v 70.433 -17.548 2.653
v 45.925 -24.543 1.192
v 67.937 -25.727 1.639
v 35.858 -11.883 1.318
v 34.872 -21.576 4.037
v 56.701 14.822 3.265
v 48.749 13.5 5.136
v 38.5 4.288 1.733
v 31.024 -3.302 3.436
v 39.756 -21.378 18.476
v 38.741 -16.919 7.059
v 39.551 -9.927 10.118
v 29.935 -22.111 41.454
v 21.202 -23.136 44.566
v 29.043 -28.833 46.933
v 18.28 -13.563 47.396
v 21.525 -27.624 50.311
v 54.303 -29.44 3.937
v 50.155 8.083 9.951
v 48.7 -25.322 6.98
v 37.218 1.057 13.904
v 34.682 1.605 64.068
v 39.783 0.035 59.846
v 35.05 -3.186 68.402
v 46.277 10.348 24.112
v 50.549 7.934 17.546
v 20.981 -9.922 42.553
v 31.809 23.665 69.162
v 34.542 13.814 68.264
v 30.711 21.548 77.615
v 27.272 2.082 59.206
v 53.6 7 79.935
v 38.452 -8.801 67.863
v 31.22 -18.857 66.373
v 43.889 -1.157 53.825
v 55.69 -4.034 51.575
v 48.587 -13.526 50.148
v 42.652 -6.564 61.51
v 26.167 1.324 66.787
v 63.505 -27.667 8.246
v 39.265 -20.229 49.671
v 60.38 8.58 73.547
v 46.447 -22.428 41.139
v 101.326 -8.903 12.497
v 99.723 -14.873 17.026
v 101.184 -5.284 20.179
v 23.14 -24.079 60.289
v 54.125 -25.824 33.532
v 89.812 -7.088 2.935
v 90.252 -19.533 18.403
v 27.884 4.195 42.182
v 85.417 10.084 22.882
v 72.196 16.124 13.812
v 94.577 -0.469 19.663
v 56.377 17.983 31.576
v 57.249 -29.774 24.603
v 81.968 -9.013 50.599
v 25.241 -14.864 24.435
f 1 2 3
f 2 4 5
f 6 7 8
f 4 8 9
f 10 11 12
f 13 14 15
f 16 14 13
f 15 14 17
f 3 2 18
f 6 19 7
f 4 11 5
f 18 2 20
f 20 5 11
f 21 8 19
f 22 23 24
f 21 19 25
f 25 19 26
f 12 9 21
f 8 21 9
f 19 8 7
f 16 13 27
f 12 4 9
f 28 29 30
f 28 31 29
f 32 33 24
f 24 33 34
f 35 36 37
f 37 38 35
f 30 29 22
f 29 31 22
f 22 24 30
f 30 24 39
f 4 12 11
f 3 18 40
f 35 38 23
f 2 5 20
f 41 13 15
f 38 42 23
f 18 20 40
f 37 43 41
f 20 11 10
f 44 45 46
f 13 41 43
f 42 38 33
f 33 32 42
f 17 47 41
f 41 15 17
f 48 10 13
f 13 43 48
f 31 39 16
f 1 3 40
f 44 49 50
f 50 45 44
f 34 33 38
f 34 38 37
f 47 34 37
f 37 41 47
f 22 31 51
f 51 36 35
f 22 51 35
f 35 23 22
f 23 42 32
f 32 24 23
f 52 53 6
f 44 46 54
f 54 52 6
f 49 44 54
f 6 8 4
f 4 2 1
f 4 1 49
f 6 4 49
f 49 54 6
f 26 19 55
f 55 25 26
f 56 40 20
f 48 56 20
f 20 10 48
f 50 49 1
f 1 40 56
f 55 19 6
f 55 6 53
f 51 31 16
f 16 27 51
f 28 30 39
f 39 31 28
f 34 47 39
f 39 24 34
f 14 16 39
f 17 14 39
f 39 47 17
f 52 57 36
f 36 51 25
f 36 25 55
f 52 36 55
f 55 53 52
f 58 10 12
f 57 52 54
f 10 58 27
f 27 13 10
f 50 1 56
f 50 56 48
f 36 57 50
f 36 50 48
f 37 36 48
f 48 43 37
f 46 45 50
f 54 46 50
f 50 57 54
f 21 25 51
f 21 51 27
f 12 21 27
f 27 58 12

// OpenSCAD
//demo mesh
Flat_treshold=0.3;
  //mesh=trimesh(cubemesh4() );
 // mesh=trimesh(cubemesh3() );
//  mesh= (diamond() );
//
// // mesh=fp_flip(bunny());
//
//echo(len(  mesh[0]),len(mesh[1]));
//
//midmesh = ( tesselate(mesh,0)) ;
// dmaesh=( midmesh );
 nm = fp_decimate (bunny(),1);


// newmesh=relax (dmaesh);
//translate ([120,0,0]) polyhedron(midmesh[0], midmesh[1]);

 translate ([60,0,0]) polyhedron(nm[0], nm[1]);
//translate ([ 0,0,0]) polyhedron(newmesh[0], newmesh[1]);
//
//translate ([-60,0,0]) polyhedron(dmaesh[0], dmaesh[1]);
  // for (i = [0: len(newmesh) - 1]) echo(newmesh[i]);
//echo(len( midmesh[0]),len(dmaesh[0]));

function  trimesh (t)=
let(
t1=t[1],
t2=fp_flatten([for(i=[0:len(t1)-1]) 
 (len( t1[i])==3)?[t1[i]]:[[t1[i][0],t1[i][1],t1[i][2]],[t1[i][0],t1[i][2],t1[i][3]]]     ] )
)[t[0],t2]
;
function tesselate(m,c=1)=
c>=1?
 let (
   pr = fp_privatetize(m), /* convert indexed polyhedron */

 subdv=fp_flatten([for(i=[0:max(0,len(pr)-1)])let(
pr01=lerp(pr[i][0],pr[i][1],0.5),
pr12=lerp(pr[i][1],pr[i][2],0.5),
pr20=lerp(pr[i][2],pr[i][0],0.5)
)[
[pr[i][0],pr01,pr20],
[pr[i][1],pr12,pr01],
[pr[i][2],pr20,pr12],
[pr01,pr12,pr20]

]
]),
 
  newmesh =   fp_glue(subdv)
)
tesselate(newmesh,c-1)
:

m;
 
function fp_decimate (m,i=0,changed=0 ,nn=0)=
let(points=m[0],faces=m[1],n=nn==0||changed>0? neighbours(m):nn )
i<len(points)-1?
let(r=flattness(m,i,n[i]) )
r<=Flat_treshold? 
let(newm=fp_decimateinidex(m,i,n[i]),
newch=len(newm[0])==len(m[0])?changed:changed+1,
newi=len(newm[0])==len(m[0])?i+1:i
)
fp_decimate (newm,newi,newch,n ) 
:fp_decimate (m,i+1,changed ,n)
:
let(e=echo(i+1,changed))
changed>0?

 fp_decimate(m)
:m

;

function flattness(m,j,n)=

let(points=m[0],faces=m[1],ni=n ,

normals=[for(i=[0:max(0,len(ni)-1)])p2n(
 [
points[(faces[ni[i]][0])],
points[(faces[ni[i]][1])],
points[(faces[ni[i]][2])] 
])

],
ne=normeq(normals)


) 
ne
;
function newflattness(m)=

let(points=m[0],faces=m[1],

normals=[for(i=[0:max(0,len(m)-1)])p2n(m[i])

],
ne=normeq(normals)


) 
ne
;
function fp_decimateinidex(m,j,n)=
let(nn=notneighboursofi (m,j),ni=n,points=m[0],faces=m[1])
let(

removies=[for(i=[0:len(ni)-1])([points[(faces[ni[i]][0])],points[(faces[ni[i]][1])],points[(faces[ni[i]][2])]  ])],
newfaces=fp_removevertex(removies,points[j],alt=3),
r=newflattness(newfaces),
h=newflattness(removies)
//e=echo(r,h)
) 
r<=h?
    let(keepers=[for(i=[0:len(nn)-1])([points[(faces[nn[i]][0])],points[(faces[nn[i]][1])],points[(faces[nn[i]][2])]  ])])
    fp_glue( concat(keepers,newfaces))
    :
    let(newfacesalt=fp_removevertex(removies,points[j],alt=5),
    ralt=newflattness(newfacesalt))
    ralt<=h?
        let(keepers=[for(i=[0:len(nn)-1])([points[(faces[nn[i]][0])],points[(faces[nn[i]][1])],points[(faces[nn[i]][2])]  ])])
        fp_glue( concat(keepers,newfacesalt))
        
        :
        let(newfacesalt2=fp_removevertex(removies,points[j],alt=7),
        ralt2=newflattness(newfacesalt2))
        ralt2<=h?
            let(keepers=[for(i=[0:len(nn)-1])([points[(faces[nn[i]][0])],points[(faces[nn[i]][1])],points[(faces[nn[i]][2])]  ])])
            fp_glue( concat(keepers,newfacesalt2))
            
            :
            let(newfacesalt3=fp_removevertex(removies,points[j],alt=11),
            ralt3=newflattness(newfacesalt3))
            ralt3<=h?
                let(keepers=[for(i=[0:len(nn)-1])([points[(faces[nn[i]][0])],points[(faces[nn[i]][1])],points[(faces[nn[i]][2])]  ])])
                fp_glue( concat(keepers,newfacesalt3))

:
m
;

function fp_glue(m)= let (
   hashed = fp_addhash(fp_flatten(m)), /*flatten and pair points with hash*/
   sorted = fp_hashQS(hashed),/*sort by hash*/
   unique = fp_unique(sorted),/*unique by hash*/
   newmesh = [fp_removehash(unique), fp_relink(unique, m)])/* combine to new mesh*/
 newmesh;
 function fusepoints(m) =
 let (
   privatetized = fp_privatetize(m), /* convert indexed polyhedron */
 newmesh= fp_glue(privatetized))
 newmesh;

 function fp_privatetize(m) = 
/* convert indexed polyhedron to vetrtex polygons with private vertex*/
 let (p = m[0], f = m[1], l = max(0,len(f) - 1))[
   for (i = [0: l])[     for (j = [0: len(f[i]) - 1]) p[f[i][j]]   ]];

 function fp_flatten(l) = [   for (a = l)     for (b = a) b ];
 
 function fp_addhash(m) = 
/*pair each point with a hash of the point*/
[   for (i = [0: len(m) - 1])[fp_encode(m[i]), m[i]] ];

 function fp_encode(v) =
 let (xseed = round(fp_rnd(1e8, -1e8, round(v.x * 1e6))),
   yseed = round(fp_rnd(1e8, -1e8, xseed + round(v.y * 1e6))),
   zseed = round(fp_rnd(1e8, -1e8, yseed + round(v.z * 1e6))),
   hash =   round(fp_rnd(1e8, -1e8, zseed)))
 hash;

 function fp_hashQS(arr) = !(len(arr) > 0) ? [] :
 let (pivot = arr[floor(len(arr) / 2)][0],
 lesser = [ for (y = [0: len(arr) - 1]) if (arr[y][0] < pivot) arr[y] ],
 equal = [ for (y = [0: len(arr) - 1]) if (arr[y][0] == pivot) arr[y] ],
 greater = [ for (y = [0: len(arr) - 1]) if (arr[y][0] > pivot) arr[y] ])
 concat(fp_hashQS(lesser), equal, fp_hashQS(greater));

 function fp_unique(m) = [   for (i = [0: len(m) - 1])     if (m[i] != m[i - 1]) m[i] ];

 function fp_rnd(a = 1, b = 0, s = []) = s == [] ? (rands(min(a, b), max(   a, b), 1)[0]) : (rands(min(a, b), max(a, b), 1, s)[0]); 

 function fp_removehash(m) = [   for (i = [0: len(m) - 1]) m[i][1] ];
 function fp_relink(p, f) =
/*convert polygons with private vertex to indexed by searching for hash matches  */
 let (l = len(f) - 1)[   for (i = [0: l])[     for (j = [0: len(f[i]) - 1]) search(fp_encode(f[i][j]), p)[0]] ];
 
 function fp_flip(w)=[w[0],[for(i=[0:len(w[1])-1])[w[1][i][0],w[1][i][2],w[1][i][1]]]];

function lerp(start, end, bias) = (end * bias + start * (1 - bias));

function relax(m, c =  2,nn=0) = 
let(points=m[0], faces=m[1], n=nn==0?neighbours(m):nn)
c > 0 ?
let(
midpoints = 
[ for (i = [0: len(faces) - 1]) avrg( 
[points[faces[i][0]], points[faces[i][1]], points[faces[i][2]]]
) ], 

points2 = [ for (i = [0: len(points) - 1]) len(
n[i]) > 0 ?  avrg([ for (j = [0: len(n[i]) - 1]) midpoints[ n[i] [j]]
 ])  : points[i] ])

relax([points2, faces]  , c - 1,n)
:
 [points, faces];

function neighbours (m)=let(points=m[0],faces=m[1]) [ for (i = [0: len(points) - 1])[ for (j = [0: len(faces) - 1])
 if (faces[j][0] == i || faces[j][1] == i || faces[j][2] == i || faces[j][3] == i) j] ];
function notneighbours (m)=let(points=m[0],faces=m[1]) [ for (i = [0: len(points) - 1])[ for (j = [0: len(faces) - 1])
 if ( (faces[j][0] != i && faces[j][1] != i && faces[j][2] != i && faces[j][3] != i)) j] ];
function neighboursofi (m,i)=let(points=m[0],faces=m[1])
  [ for (j = [0: len(faces) - 1])
 if (faces[j][0] == i || faces[j][1] == i || faces[j][2] == i || faces[j][3] == i) j] ;
function notneighboursofi (m,i)=let(points=m[0],faces=m[1])
  [ for (j = [0: len(faces) - 1])
 if ( (faces[j][0] != i && faces[j][1] != i && faces[j][2] != i && faces[j][3] != i)) j] ;
function addl(l, c = 0) = c < len(l) - 1 ? l[c] + addl(l, c + 1) : l[
 c];
function avrg(l) = len(l) > 1 ? addl(l) / (len(l)) : l;

function fp_removevertex(faces,vertex,alt=0)=let(
n= avrg([for(i=[0:max(0,len(faces)-1)])p2n(faces[i])]),
d= fp_tricylceb(faces,vertex),
c= fp_segorder(d),
e=fp_segcollapse(c),
g=shuffle(e,alt-round(rnd(2))),
f=fp_triangulate(g,n)
//,eco=echo( len(d),len(c))
)
 len(faces)>2&&len(c)==len(d)&&len(f)+2==len(faces)?f: faces 
;


function shuffle(b,l=1)=let(
c=concat( [for(i=[1:len(b)-1])b[i]],[b[0]]))
l>0?shuffle(c,l-1):c
;
function fp_tricylceb(b,p)=[for(i=[0:len(b)-1])fp_tricycle (b[i],p)];

function fp_triangulate(a,n ,count=0)=
count>len(a)?
a
:
len(a)<=3?
[[a[0],a[1],a[2]]]:
sign(dot(p2n([a[0],a[1],a[2]]),n))>0?
let(b=concat([for(i=[2:len(a)-1])a[i]],[a[0]] )) 
concat([[a[0],a[1],a[2]]],fp_triangulate( shuffle(b,2),n )):fp_triangulate( shuffle(a,1),n,count+1 );

function fp_trimeshulate(a)=len(a)>3?let(b=concat([for(i=[2:len(a)-1])a[i]],[a[0]] )
) concat([[a[0],a[1],a[2]]],fp_trimeshulate(shuffle(b,2))):[[a[0],a[1],a[2]]];

function fp_tricycle(f,p)=fp_is_equal(f[0],p)?[f[1],f[2]]:let(f1=[f[1],f[2],f[0]])fp_is_equal(f1[0],p)?[f1[1],f1[2]]:let(f2=[f1[1],f1[2],f1[0]])fp_is_equal(f2[0],p)?[f2[1],f2[2]]:f;

 function fp_is_equal(a, b, d=1e-16) = (a==b) || (abs(a-b)<d) || (norm(a-b)<d);
    function flatten(l) = [ for (li = l, lij = li) lij ];

function rnd(a = 1, b = 0) = (rands(min(a, b), max(a, b), 1)[0]);

 function fp_segorder(n,acc=0,c=0)=c<=len(n)-1?let(newacc= (acc==0)?[n[0]]:let(lookfor= acc[0][0]) concat([for(i=[0:len(n)-1])if(fp_is_equal(lookfor,n[i][1])==true)n[i]],acc ))fp_segorder(n,newacc,c+1):acc;

function fp_segcollapse(n)=
[for(i=[0:len(n)-1])n[i][0]];

function normeq(pl) = 

let (list= [
 for (i = [0: len(pl) - 1],j = [0: len(pl) - 1])
 
 (-1 + dot(pl[i], pl[j])  )
   ]
,
sums = avrg(list) )
 
abs(sums)
 ;

function p2n4(p) =un(p2n(p0,p1,p3)+p2n(p3,p1,p2));
function p2n(p) =
let (pa=p[0], pb=p[1], pc=p[2],
u = pa - pb, v = pa - pc) un([u[1] * v[2] - u[2] * v[1], u[2] *
 v[0] - u[0] * v[2], u[0] * v[1] - u[1] * v[0]
]);
function un(v) = v / max(len3(v), 0.000001) * 1; // div by zero safe unit normal
function dot(v1, v2) = v1[0] * v2[0] + v1[1] * v2[1] + v1[2] * v2[2];
function addl(l, c = 0) = c < len(l) - 1 ? l[c] + addl(l, c + 1) : l[
 c];
function len3(v) = len(v) > 1 ? sqrt(addl([
 for (i = [0: len(v) - 1]) pow(v[i], 2)
])) : len(v) == 1 ? v[0] : v;



module trender(t) {
 C0 = (un(rndc()) + [2, 0, 0]);
 C1 = (un(rndc()) + [2, 2, 0]);
 C2 = (un(rndc()) + [0, 2, 2]);
 for (i = [0: max(0, len(t[1]) - 1)]) {
 n = un(p2n(t[0][t[1][i][0]], t[0]
 [t[1][i][1]], t[0][t[1][i][
 2
 ]]));
 color(un((C0 * abs(n[0]) + C1 * abs(n[1]) + C2 * abs(n[2]) + [
 1, 1, 1
 ] * abs(n[2])) / 4)) polyhedron(t[0], [t[1][i]]);
 }
}
function rndc(a = 1, b = 0,seed) = [rnd(a, b,seed),
 rnd(a, b,seed+1), rnd(a, b,seed+2)
];
function bunny()=[[[33.718,-8.247,33.616],[-30.065,-22.111,41.454],[1.142,14.457,35.998],[20.205,-17.34,49.075],[36.378,-2.827,7.022],[-11.251,13.5,5.136],[29.105,-18.728,7.239],[-9.845,8.083,9.951],[-36.86,-24.079,60.289],[-28.976,-3.302,3.436],[-11.413,-13.526,50.148],[28.736,-0.816,42.915],[-32.116,4.195,42.182],[29.812,-7.088,2.935],[-37.993,-15.409,34.838],[-28.78,-18.857,66.373],[-29.289,21.548,77.615],[-28.191,23.665,69.162],[-36.226,-11.242,66.87],[31.967,2.895,30.506],[-25.318,1.605,64.068],[-41.72,-13.563,47.396],[3.505,-27.667,8.246],[18.251,9.502,40.482],[-40.705,-8.309,57.649],[-34.759,-14.864,24.435],[41.326,-8.903,12.497],[7.937,-25.727,1.639],[0.142,18.861,18.906],[37.372,0.543,12.665],[11.469,-25.566,39.178],[-11.3,-25.322,6.98],[16.983,0.961,50.904],[25.417,10.084,22.882],[12.196,16.124,13.812],[-38.798,-23.136,44.566],[-6.906,16.568,23.283],[-11.406,5.707,70.997],[27.876,3.576,10.072],[-29.124,6.104,23.795],[30.252,-19.533,18.403],[-24.95,-3.186,68.402],[-21.5,4.288,1.733],[-20.217,0.035,59.846],[-16.111,-1.157,53.825],[9.791,18.388,28.806],[-20.449,-9.927,10.118],[-5.697,-29.44,3.937],[-14.075,-24.543,1.192],[-38.314,-4.065,30.749],[-17.348,-6.564,61.51],[39.723,-14.873,17.026],[-24.142,-11.883,1.318],[4.044,-18.973,49.654],[-25.128,-21.576,4.037],[28.884,-15.239,42.197],[-7.042,-23.574,16.146],[-22.782,1.057,13.904],[-30.957,-28.833,46.933],[-13.723,10.348,24.112],[-6.4,7,79.935],[0.38,8.58,73.547],[-2.751,-29.774,24.603],[32.871,-16.125,29.207],[-3.623,17.983,31.576],[17.513,4.686,2.883],[-30.017,-27.275,56.561],[13.323,-29.14,13.068],[-20.244,-21.378,18.476],[-20.735,-20.229,49.671],[34.577,-0.469,19.663],[-32.728,2.082,59.206],[1.448,8.004,45.899],[-21.1,-24.65,32.38],[-3.299,14.822,3.265],[37.681,-9.851,21.953],[10.732,-31.947,27.781],[-25.458,13.814,68.264],[14.963,11.754,4.948],[-21.548,-8.801,67.863],[2.005,-5.173,1.969],[-23.472,3.741,51.505],[21.968,-9.013,50.599],[-9.451,7.934,17.546],[41.184,-5.284,20.179],[-39.539,-2.907,46.751],[-39.019,-9.922,42.553],[-16.487,10.221,37.797],[-9.537,-0.368,72.53],[-13.553,-22.428,41.139],[-5.875,-25.824,33.532],[10.433,-17.548,2.653],[-40.968,-17.45,57.613],[-32.842,15.053,71.785],[-4.31,-4.034,51.575],[10.947,-7.696,54.207],[1.296,-30.04,33.917],[-33.833,1.324,66.787],[-27.494,-6.782,16.239],[-21.944,-17.558,61.153],[-38.475,-27.624,50.311],[24.879,-24.385,33.536],[-21.259,-16.919,7.059],[-21.259,-16.919,7.059],[-21.259,-16.919,7.059]],[[80,91,48],[27,48,91],[68,98,46],[48,52,80],[98,25,49],[54,52,48],[42,74,80],[52,42,80],[42,5,74],[6,13,26],[25,98,68],[9,42,52],[46,103,68],[58,35,1],[1,35,21],[80,74,65],[100,35,58],[80,65,13],[91,80,13],[27,91,6],[6,91,13],[47,48,27],[51,75,40],[87,59,39],[5,7,74],[2,72,23],[28,74,7],[54,104,52],[64,28,36],[60,61,37],[39,57,98],[64,45,28],[34,74,28],[31,48,47],[102,54,31],[7,42,57],[59,57,39],[12,81,87],[37,43,41],[2,45,64],[74,34,78],[41,43,20],[59,7,57],[28,45,34],[87,39,12],[45,33,34],[37,41,60],[12,71,81],[34,33,78],[72,2,87],[38,29,65],[65,29,4],[49,12,39],[50,79,99],[94,72,44],[23,11,19],[27,6,67],[72,81,44],[44,81,43],[87,81,72],[70,75,84],[43,81,20],[45,2,23],[29,70,84],[19,33,23],[33,45,23],[32,72,94],[83,7,59],[98,57,46],[57,9,46],[71,85,24],[97,71,24],[97,93,71],[85,12,49],[49,39,98],[9,57,42],[32,94,95],[23,72,32],[71,93,17],[18,24,92],[5,42,7],[86,1,21],[83,59,36],[83,36,7],[36,28,7],[64,36,59],[23,32,11],[93,16,17],[12,85,71],[18,8,15],[92,35,100],[87,2,59],[22,62,56],[9,52,46],[8,92,100],[90,62,96],[14,1,86],[93,97,16],[14,25,73],[25,68,73],[1,14,73],[16,77,17],[30,90,96],[2,64,59],[8,100,66],[77,71,17],[32,82,11],[41,79,60],[15,79,41],[3,55,82],[82,55,11],[10,94,44],[44,50,10],[20,77,16],[79,88,60],[20,71,77],[99,69,10],[21,92,24],[50,99,10],[16,41,20],[8,18,92],[97,41,16],[22,27,67],[51,84,75],[15,66,99],[97,18,41],[55,0,11],[4,26,13],[55,63,0],[70,38,33],[102,46,52],[14,49,25],[75,0,63],[74,78,65],[19,70,33],[38,65,78],[33,38,78],[86,85,49],[97,24,18],[65,4,13],[86,49,14],[70,29,38],[50,61,88],[6,26,51],[37,61,43],[30,76,101],[40,101,67],[101,76,67],[30,101,3],[101,40,63],[55,3,101],[40,75,63],[22,47,27],[67,6,40],[60,88,61],[43,50,44],[19,11,0],[63,55,101],[26,4,29],[84,26,29],[31,54,48],[69,99,66],[58,1,69],[69,66,58],[76,62,67],[3,53,30],[67,62,22],[43,61,50],[30,96,76],[96,62,76],[22,31,47],[53,89,30],[89,90,30],[95,3,82],[56,31,22],[95,53,3],[10,89,53],[90,56,62],[90,73,56],[40,6,51],[89,73,90],[21,85,86],[56,68,31],[0,75,70],[73,68,56],[69,89,10],[68,102,31],[84,51,26],[15,41,18],[89,69,1],[1,73,89],[92,21,35],[82,32,95],[24,85,21],[0,70,19],[71,20,81],[8,66,15],[79,50,88],[66,100,58],[94,53,95],[15,99,79],[10,53,94]]];


function diamond()=



[[[-4.10863, -0.140602, -3.6055], [-3.84601, -3.60175, -1.47346], [-3.97796, -4.24691, -0.613285], [-2.53813, -0.848251, -6.37256], [-2.18844, -1.82373, -4.13948], [-0.0333337, -0.848251, -6.37256], [-0.107152, -1.93214, -3.8401], [-1.97693, -1.14585, -5.02233], [-0.274562, -1.22818, -4.66476], [-3.44904, -3.49388, -1.8379], [-2.53813, -6.1872, 0.213072], [-0.037514, -3.74431, -1.36103], [1.90021, -5.55326, 1.49797], [-2.17048, -4.75789, 0.0422999], [0.38598, -5.22305, 0.760223], [-4.55809, -2.31577, -1.67114], [-6.44044, -0.0759498, -0.538324], [-6.32277, -1.73312, 0.916171], [-5.9166, -0.0467461, -1.88034], [-5.65828, -2.40612, -0.340622], [-6.96031, -0.89379, 0.448986], [-6.65543, -1.13852, -0.358017], [-2.88119, -2.59327, -3.09619], [-0.0989006, -2.70754, -2.83311], [-3.60055, -1.31693, -3.26812], [-2.53813, -2.6279, 0.213072], [-0.0333337, -0.848251, -1.98214], [-0.0333337, -2.6279, 0.213072], [2.15047, -1.95664, -3.656], [3.80216, -1.72573, -3.28922], [1.56304, -1.48258, -4.06836], [3.83668, -0.578218, -3.60172], [2.68802, -3.77158, -1.23882], [2.83805, -5.71606, 1.54781], [5.02919, -3.92323, -0.983753], [3.92337, -5.44133, 1.27551], [2.72541, -4.80807, 0.236576], [5.02994, -4.6583, 0.245474], [7.48106, -0.848251, -4.17735], [7.48106, -4.40755, -1.98214], [6.60705, -3.53789, 1.16426], [2.83029, -2.38095, -3.21484], [5.84927, -2.95745, -2.39152], [2.47146, -0.848251, -1.98214], [2.47146, -2.6279, 0.213072], [6.11744, -0.664958, -2.92074], [6.43254, -3.13239, -0.469602], [7.22257, -2.26381, -1.08929], [6.65182, -0.574654, -2.63706], [8.58868, -1.57387, 0.498089], [9.98586, -2.6279, 0.213072], [8.86667, -0.790335, 0.374336], [8.84603, -0.149826, 1.18825], [-4.87593, 1.50124, -3.97146], [-4.70862, 2.29828, -4.04328], [-2.53813, 0.931399, -6.37256], [-0.0333337, 0.931399, -6.37256], [-2.53813, 2.71105, -6.37256], [-1.92777, -0.992021, -5.03321], [-0.0333337, 2.71105, -6.37256], [-0.995141, 0.58903, -5.22706], [-2.83857, 2.64671, -4.83497], [-0.750299, 2.94568, -5.55327], [-4.06563, 3.93282, -3.18426], [-6.40319, 0.425744, -0.412854], [-5.75953, 0.527687, -2.25537], [-6.99193, 0.969201, 1.4556], [-5.02031, 3.91375, -2.41588], [-6.36916, 1.93535, 0.391189], [-7.54773, 2.71105, 0.213072], [-5.83043, 2.72602, -0.366366], [-0.0333337, 4.4907, -6.37256], [-2.95489, 4.38504, -3.58535], [-0.877111, 5.02743, -4.1213], [-2.53813, 6.27035, -4.17735], [-0.0333337, 6.27035, -4.17735], [-4.76143, 4.15636, -2.33779], [-4.16403, 4.15885, 0.111998], [-3.22708, 5.14215, -0.9632], [-1.14664, 5.60559, -1.71968], [-1.66131, 5.80306, -0.514935], [-2.62796, 5.5636, 0.410056], [-1.52977, 5.81804, -0.660227], [-0.446236, 5.67479, 0.418208], [-1.75275, 5.8585, -0.193377], [-1.41853, 5.85982, -0.269016], [-4.54762, -3.75071, 3.14745], [-3.71454, -3.78975, 3.72922], [-2.53813, -6.1872, 2.40828], [1.95471, -5.51812, 2.02936], [-1.98562, -4.49762, 2.43775], [0.605838, -5.10006, 2.73186], [-0.0333337, -6.1872, 4.60349], [-2.1796, -4.16354, 4.20972], [0.220772, -4.657, 5.04817], [-6.28168, -1.83123, 1.66813], [-5.33131, -3.05158, 3.25984], [-6.7583, -0.821015, 1.81635], [-6.00906, -0.691373, 3.23509], [-5.01305, -2.50056, 4.10666], [-7.54773, -0.848251, 4.60349], [-5.05032, -1.18996, 4.9624], [-2.53813, -2.6279, 2.40828], [-2.13919, -2.76434, 5.27905], [-0.478659, -3.32594, 5.65739], [-2.8572, -1.53707, 5.73698], [-0.0333337, -0.848251, 4.60349], [1.40225, -3.9013, 6.19035], [-5.04293, -0.848251, 6.7987], [-0.907379, -2.11602, 6.31779], [0.598011, -2.49364, 6.82502], [-1.09261, -1.85583, 6.29929], [0.925692, -0.912368, 6.68243], [2.47146, 2.71105, -6.37256], [1.57593, 0.832456, -4.50757], [3.86489, 1.76097, -4.05165], [1.83142, 2.49517, -4.66334], [3.50857, 2.16194, -4.07357], [7.48106, 0.931399, -4.17735], [7.48106, 2.71105, -4.17735], [0.927679, 4.60082, -3.54521], [4.97626, 4.4907, -4.17735], [5.60468, 1.48375, -3.48449], [3.02465, 3.60509, -3.20588], [4.69642, 3.79178, -2.32503], [4.97626, 2.71105, 0.213072], [7.28769, 1.33692, -2.80066], [7.10103, 3.30374, -1.62038], [8.91038, 0.594316, 0.471455], [8.79874, 0.177289, 1.19532], [7.25544, 3.28327, -1.09866], [9.98586, 2.71105, 0.213072], [2.38489, 4.5449, -2.73796], [4.94993, 4.02157, -1.7848], [2.47146, 6.27035, -1.98214], [2.25305, 5.13412, 1.26447], [5.98923, 4.14473, 0.694604], [2.47146, 6.27035, 0.213072], [4.97626, 6.27035, 0.213072], [6.10839, 3.74254, -1.03395], [6.44784, 3.85258, 0.124204], [3.63356, -5.93983, 1.99458], [4.29407, -5.80738, 1.96402], [2.1521, -5.36055, 3.48979], [3.60251, -5.58484, 3.54027], [4.63112, -5.61119, 1.90199], [4.43858, -5.3304, 3.31399], [2.56493, -5.20374, 5.66859], [6.64743, -4.16945, 4.61148], [6.58158, -3.88963, 2.51602], [6.69287, -4.22084, 4.47167], [4.97626, -2.6279, 2.40828], [6.20177, -3.5936, 5.36913], [6.10459, 0.186099, 5.5842], [2.47146, -6.1872, 6.7987], [3.07735, -4.60228, 6.48149], [4.68258, -4.24091, 5.85724], [7.82046, -2.66139, 2.57944], [8.30424, -0.773894, 2.36074], [6.92055, -3.89612, 4.68602], [8.72116, -0.105558, 1.58722], [7.42911, -0.759798, 4.85241], [2.83186, -2.96797, 7.53465], [5.33017, -2.67575, 6.59174], [3.03607, -0.677601, 7.2506], [2.47146, -2.6279, 8.99391], [5.45436, -0.369361, 6.53547], [2.47146, -0.848251, 8.99391], [6.58971, -2.335, 6.0984], [6.71974, -1.44671, 6.08463], [-7.01509, 0.965476, 1.33196], [-5.93065, 1.78085, 2.42897], [-7.54773, 2.71105, 2.40828], [-4.25257, 3.10903, 3.81421], [-4.43171, 1.05919, 4.67493], [-3.97833, 2.70613, 4.44912], [-3.54766, 3.65164, 3.31828], [-2.1615, 0.698256, 5.44592], [-1.45723, 3.44114, 3.69473], [-0.612926, 1.46768, 5.68235], [-2.62304, 2.53125, 4.88518], [-0.354467, 2.18707, 5.50257], [-3.87248, 3.96791, 1.69684], [-5.04293, 4.4907, 4.60349], [-3.00649, 4.61703, 2.02873], [-0.272702, 4.3237, 2.4991], [-2.53813, 6.27035, 2.40828], [-2.53813, 4.4907, 4.60349], [-0.0333337, 6.27035, 2.40828], [0.867876, 3.48696, 3.71022], [-0.81646, -0.0217327, 5.9989], [0.883914, 1.53673, 6.15091], [-2.53813, 2.71105, 6.7987], [1.23386, 1.82958, 5.98969], [2.47146, 2.71105, 2.40828], [2.47146, 0.931399, 4.60349], [5.95758, 3.73293, 3.30952], [5.1154, 1.90952, 5.45984], [2.52823, 2.7118, 4.86052], [5.17682, 2.81784, 4.6537], [8.6324, 1.13685, 2.31573], [8.73021, 0.22765, 1.5864], [7.20341, 2.796, 2.56305], [7.80901, 0.297881, 3.82064], [6.6867, 2.07576, 3.69413], [2.85691, 4.93536, 1.7438], [5.42898, 4.50011, 2.37199], [2.47146, 6.27035, 2.40828], [2.57168, 3.62621, 3.54726], [4.97626, 6.27035, 2.40828], [4.18949, 3.69698, 3.4517], [3.26533, 1.08488, 7.0259], [4.41927, 1.24853, 6.66006], [2.66961, 1.95828, 5.88189], [3.93665, 1.97327, 5.74871], [6.38898, 3.73076, 1.44543]], [[19, 2, 1], [19, 1, 15], [21, 19, 15], [21, 15, 18], [24, 22, 4], [24, 4, 7], [31, 29, 42], [31, 42, 45], [42, 34, 37], [42, 37, 46], [48, 47, 49], [48, 49, 51], [65, 18, 0], [65, 0, 53], [66, 20, 16], [66, 16, 64], [67, 65, 53], [67, 53, 54], [70, 68, 65], [70, 65, 67], [76, 67, 54], [76, 54, 63], [77, 70, 67], [77, 67, 76], [84, 81, 78], [84, 78, 80], [82, 79, 83], [82, 83, 85], [91, 89, 12], [91, 12, 14], [96, 86, 2], [96, 2, 19], [97, 95, 17], [97, 17, 20], [99, 87, 86], [99, 86, 96], [101, 99, 96], [101, 96, 98], [110, 107, 94], [110, 94, 104], [111, 109, 103], [111, 103, 105], [115, 31, 45], [115, 45, 122], [117, 115, 122], [117, 122, 124], [126, 48, 51], [126, 51, 128], [127, 126, 128], [127, 128, 130], [120, 116, 123], [120, 123, 132], [139, 127, 130], [139, 130, 140], [37, 35, 142], [37, 142, 145], [147, 144, 141], [147, 141, 143], [145, 142, 146], [145, 146, 148], [49, 40, 149], [49, 149, 157], [51, 49, 157], [51, 157, 158], [157, 149, 150], [157, 150, 159], [158, 157, 159], [158, 159, 161], [152, 148, 156], [152, 156, 163], [161, 159, 168], [161, 168, 169], [170, 97, 20], [170, 20, 66], [173, 171, 68], [173, 68, 70], [174, 101, 98], [174, 98, 171], [175, 174, 171], [175, 171, 173], [182, 173, 70], [182, 70, 77], [189, 181, 178], [189, 178, 185], [190, 111, 105], [190, 105, 177], [193, 191, 179], [193, 179, 181], [129, 52, 160], [129, 160, 201], [130, 128, 200], [130, 200, 202], [200, 158, 161], [200, 161, 203], [202, 200, 203], [202, 203, 204], [206, 196, 199], [206, 199, 210], [197, 153, 166], [197, 166, 212], [199, 197, 212], [199, 212, 214], [140, 130, 202], [140, 202, 215], [9, 1, 2], [9, 2, 13], [11, 9, 13], [11, 13, 14], [18, 16, 20], [18, 20, 21], [6, 4, 22], [6, 22, 23], [7, 0, 18], [7, 18, 24], [32, 11, 14], [32, 14, 36], [34, 32, 36], [34, 36, 37], [28, 6, 23], [28, 23, 41], [29, 28, 41], [29, 41, 42], [47, 42, 46], [47, 46, 49], [68, 66, 64], [68, 64, 65], [78, 76, 63], [78, 63, 72], [79, 78, 72], [79, 72, 73], [81, 77, 76], [81, 76, 78], [85, 84, 80], [85, 80, 82], [13, 2, 86], [13, 86, 90], [14, 13, 90], [14, 90, 91], [90, 86, 87], [90, 87, 93], [91, 90, 93], [91, 93, 94], [19, 17, 95], [19, 95, 96], [104, 103, 109], [104, 109, 110], [124, 123, 116], [124, 116, 117], [132, 79, 73], [132, 73, 120], [135, 83, 79], [135, 79, 132], [136, 135, 132], [136, 132, 133], [140, 136, 133], [140, 133, 139], [33, 12, 89], [33, 89, 141], [35, 33, 141], [35, 141, 142], [142, 141, 144], [142, 144, 146], [143, 91, 94], [143, 94, 147], [40, 37, 145], [40, 145, 149], [149, 145, 148], [149, 148, 150], [147, 94, 107], [147, 107, 155], [148, 147, 155], [148, 155, 156], [52, 51, 158], [52, 158, 160], [159, 152, 163], [159, 163, 168], [169, 166, 153], [169, 153, 161], [171, 170, 66], [171, 66, 68], [180, 175, 173], [180, 173, 176], [181, 180, 176], [181, 176, 178], [184, 182, 77], [184, 77, 81], [185, 184, 81], [185, 81, 83], [191, 190, 177], [191, 177, 179], [201, 200, 128], [201, 128, 129], [204, 199, 196], [204, 196, 202], [205, 185, 83], [205, 83, 135], [206, 205, 135], [206, 135, 136], [208, 189, 185], [208, 185, 205], [210, 208, 205], [210, 205, 206], [213, 193, 181], [213, 181, 198], [214, 213, 198], [214, 198, 199], [215, 206, 136], [215, 136, 140], [7, 4, 6], [7, 6, 8], [20, 17, 19], [20, 19, 21], [15, 1, 9], [15, 9, 22], [22, 9, 11], [22, 11, 23], [18, 15, 22], [18, 22, 24], [8, 6, 28], [8, 28, 30], [30, 28, 29], [30, 29, 31], [14, 12, 33], [14, 33, 36], [36, 33, 35], [36, 35, 37], [23, 11, 32], [23, 32, 41], [41, 32, 34], [41, 34, 42], [45, 42, 47], [45, 47, 48], [46, 37, 40], [46, 40, 49], [53, 0, 7], [53, 7, 58], [58, 7, 8], [58, 8, 60], [54, 53, 58], [54, 58, 61], [61, 58, 60], [61, 60, 62], [64, 16, 18], [64, 18, 65], [63, 54, 61], [63, 61, 72], [72, 61, 62], [72, 62, 73], [80, 78, 79], [80, 79, 82], [85, 83, 81], [85, 81, 84], [98, 96, 95], [98, 95, 97], [103, 93, 87], [103, 87, 99], [104, 94, 93], [104, 93, 103], [105, 103, 99], [105, 99, 101], [112, 110, 109], [112, 109, 111], [60, 8, 30], [60, 30, 114], [114, 30, 31], [114, 31, 115], [62, 60, 114], [62, 114, 116], [116, 114, 115], [116, 115, 117], [73, 62, 116], [73, 116, 120], [122, 45, 48], [122, 48, 126], [124, 122, 126], [124, 126, 127], [128, 51, 52], [128, 52, 129], [132, 123, 124], [132, 124, 133], [133, 124, 127], [133, 127, 139], [143, 141, 89], [143, 89, 91], [148, 146, 144], [148, 144, 147], [159, 150, 148], [159, 148, 152], [162, 155, 107], [162, 107, 110], [163, 156, 155], [163, 155, 162], [164, 162, 110], [164, 110, 112], [166, 163, 162], [166, 162, 164], [169, 168, 163], [169, 163, 166], [171, 98, 97], [171, 97, 170], [177, 105, 101], [177, 101, 174], [180, 177, 174], [180, 174, 175], [181, 179, 177], [181, 177, 180], [184, 176, 173], [184, 173, 182], [185, 178, 176], [185, 176, 184], [191, 112, 111], [191, 111, 190], [201, 160, 158], [201, 158, 200], [203, 161, 153], [203, 153, 197], [204, 203, 197], [204, 197, 199], [208, 198, 181], [208, 181, 189], [210, 199, 198], [210, 198, 208], [211, 164, 112], [211, 112, 191], [212, 166, 164], [212, 164, 211], [213, 211, 191], [213, 191, 193], [214, 212, 211], [214, 211, 213], [215, 202, 196], [215, 196, 206]]]





;
function cubemesh4() = [
   [
     [-10, -10, -10],
     [10, -10, -10],
     [10, 10, -10],
     [-10, 10, -10],
     [-10, -10, -10],
     [10, -10, -10],
     [10, -10, 10],
     [-10, -10, 10],
     [10, -10, -10],
     [10, 10, -10],
     [10, 10, 10],
     [10, -10, 10],
     [10, 10, -10],
     [-10, 10, -10],
     [-10, 10, 10],
     [10, 10, 10],
     [-10, 10, -10],
     [-10, -10, -10],
     [-10, -10, 10],
     [-10, 10, 10],
     [-10, -10, 10],
     [10, -10, 10],
     [10, 10, 10],
     [-10, 10, 10]
   ],
   [
     [0, 1, 2, 3],
     [7, 6, 5, 4],
     [11, 10, 9, 8],
     [15, 14, 13, 12],
     [19, 18, 17, 16],
    [23, 22, 21, 20]

//,
//     [0, 1, 2],
//     [0,  2, 3]
//,
//     [7, 6, 5],
//     [7,  5, 4],
//     [11, 10, 9],
//     [11, , 9, 8],
//     [15, 14, 13],
//     [15,  13, 12],
//     [19, 18, 17],
//     [19,  17, 16]
//,
//    [23, 22, 21],
//    [23,  21, 20]
 
   ]
 ];
function cubemesh3() = [
   [
     [-10, -10, -10],
     [10, -10, -10],
     [10, 10, -10],
     [-10, 10, -10],
     [-10, -10, -10],
     [10, -10, -10],
     [10, -10, 10],
     [-10, -10, 10],
     [10, -10, -10],
     [10, 10, -10],
     [10, 10, 10],
     [10, -10, 10],
     [10, 10, -10],
     [-10, 10, -10],
     [-10, 10, 10],
     [10, 10, 10],
     [-10, 10, -10],
     [-10, -10, -10],
     [-10, -10, 10],
     [-10, 10, 10],
     [-10, -10, 10],
     [10, -10, 10],
     [10, 10, 10],
     [-10, 10, 10]
   ],
   [
//     [0, 1, 2, 3],
//     [7, 6, 5, 4],
//     [11, 10, 9, 8],
//     [15, 14, 13, 12],
//     [19, 18, 17, 16],
//    [23, 22, 21, 20]

 
     [0, 1, 2],
     [0,  2, 3]
,
     [7, 6, 5],
     [7,  5, 4],
     [11, 10, 9],
     [11, , 9, 8],
     [15, 14, 13],
     [15,  13, 12],
     [19, 18, 17],
     [19,  17, 16]
,
    [23, 22, 21],
    [23,  21, 20]
 
   ]
 ];
